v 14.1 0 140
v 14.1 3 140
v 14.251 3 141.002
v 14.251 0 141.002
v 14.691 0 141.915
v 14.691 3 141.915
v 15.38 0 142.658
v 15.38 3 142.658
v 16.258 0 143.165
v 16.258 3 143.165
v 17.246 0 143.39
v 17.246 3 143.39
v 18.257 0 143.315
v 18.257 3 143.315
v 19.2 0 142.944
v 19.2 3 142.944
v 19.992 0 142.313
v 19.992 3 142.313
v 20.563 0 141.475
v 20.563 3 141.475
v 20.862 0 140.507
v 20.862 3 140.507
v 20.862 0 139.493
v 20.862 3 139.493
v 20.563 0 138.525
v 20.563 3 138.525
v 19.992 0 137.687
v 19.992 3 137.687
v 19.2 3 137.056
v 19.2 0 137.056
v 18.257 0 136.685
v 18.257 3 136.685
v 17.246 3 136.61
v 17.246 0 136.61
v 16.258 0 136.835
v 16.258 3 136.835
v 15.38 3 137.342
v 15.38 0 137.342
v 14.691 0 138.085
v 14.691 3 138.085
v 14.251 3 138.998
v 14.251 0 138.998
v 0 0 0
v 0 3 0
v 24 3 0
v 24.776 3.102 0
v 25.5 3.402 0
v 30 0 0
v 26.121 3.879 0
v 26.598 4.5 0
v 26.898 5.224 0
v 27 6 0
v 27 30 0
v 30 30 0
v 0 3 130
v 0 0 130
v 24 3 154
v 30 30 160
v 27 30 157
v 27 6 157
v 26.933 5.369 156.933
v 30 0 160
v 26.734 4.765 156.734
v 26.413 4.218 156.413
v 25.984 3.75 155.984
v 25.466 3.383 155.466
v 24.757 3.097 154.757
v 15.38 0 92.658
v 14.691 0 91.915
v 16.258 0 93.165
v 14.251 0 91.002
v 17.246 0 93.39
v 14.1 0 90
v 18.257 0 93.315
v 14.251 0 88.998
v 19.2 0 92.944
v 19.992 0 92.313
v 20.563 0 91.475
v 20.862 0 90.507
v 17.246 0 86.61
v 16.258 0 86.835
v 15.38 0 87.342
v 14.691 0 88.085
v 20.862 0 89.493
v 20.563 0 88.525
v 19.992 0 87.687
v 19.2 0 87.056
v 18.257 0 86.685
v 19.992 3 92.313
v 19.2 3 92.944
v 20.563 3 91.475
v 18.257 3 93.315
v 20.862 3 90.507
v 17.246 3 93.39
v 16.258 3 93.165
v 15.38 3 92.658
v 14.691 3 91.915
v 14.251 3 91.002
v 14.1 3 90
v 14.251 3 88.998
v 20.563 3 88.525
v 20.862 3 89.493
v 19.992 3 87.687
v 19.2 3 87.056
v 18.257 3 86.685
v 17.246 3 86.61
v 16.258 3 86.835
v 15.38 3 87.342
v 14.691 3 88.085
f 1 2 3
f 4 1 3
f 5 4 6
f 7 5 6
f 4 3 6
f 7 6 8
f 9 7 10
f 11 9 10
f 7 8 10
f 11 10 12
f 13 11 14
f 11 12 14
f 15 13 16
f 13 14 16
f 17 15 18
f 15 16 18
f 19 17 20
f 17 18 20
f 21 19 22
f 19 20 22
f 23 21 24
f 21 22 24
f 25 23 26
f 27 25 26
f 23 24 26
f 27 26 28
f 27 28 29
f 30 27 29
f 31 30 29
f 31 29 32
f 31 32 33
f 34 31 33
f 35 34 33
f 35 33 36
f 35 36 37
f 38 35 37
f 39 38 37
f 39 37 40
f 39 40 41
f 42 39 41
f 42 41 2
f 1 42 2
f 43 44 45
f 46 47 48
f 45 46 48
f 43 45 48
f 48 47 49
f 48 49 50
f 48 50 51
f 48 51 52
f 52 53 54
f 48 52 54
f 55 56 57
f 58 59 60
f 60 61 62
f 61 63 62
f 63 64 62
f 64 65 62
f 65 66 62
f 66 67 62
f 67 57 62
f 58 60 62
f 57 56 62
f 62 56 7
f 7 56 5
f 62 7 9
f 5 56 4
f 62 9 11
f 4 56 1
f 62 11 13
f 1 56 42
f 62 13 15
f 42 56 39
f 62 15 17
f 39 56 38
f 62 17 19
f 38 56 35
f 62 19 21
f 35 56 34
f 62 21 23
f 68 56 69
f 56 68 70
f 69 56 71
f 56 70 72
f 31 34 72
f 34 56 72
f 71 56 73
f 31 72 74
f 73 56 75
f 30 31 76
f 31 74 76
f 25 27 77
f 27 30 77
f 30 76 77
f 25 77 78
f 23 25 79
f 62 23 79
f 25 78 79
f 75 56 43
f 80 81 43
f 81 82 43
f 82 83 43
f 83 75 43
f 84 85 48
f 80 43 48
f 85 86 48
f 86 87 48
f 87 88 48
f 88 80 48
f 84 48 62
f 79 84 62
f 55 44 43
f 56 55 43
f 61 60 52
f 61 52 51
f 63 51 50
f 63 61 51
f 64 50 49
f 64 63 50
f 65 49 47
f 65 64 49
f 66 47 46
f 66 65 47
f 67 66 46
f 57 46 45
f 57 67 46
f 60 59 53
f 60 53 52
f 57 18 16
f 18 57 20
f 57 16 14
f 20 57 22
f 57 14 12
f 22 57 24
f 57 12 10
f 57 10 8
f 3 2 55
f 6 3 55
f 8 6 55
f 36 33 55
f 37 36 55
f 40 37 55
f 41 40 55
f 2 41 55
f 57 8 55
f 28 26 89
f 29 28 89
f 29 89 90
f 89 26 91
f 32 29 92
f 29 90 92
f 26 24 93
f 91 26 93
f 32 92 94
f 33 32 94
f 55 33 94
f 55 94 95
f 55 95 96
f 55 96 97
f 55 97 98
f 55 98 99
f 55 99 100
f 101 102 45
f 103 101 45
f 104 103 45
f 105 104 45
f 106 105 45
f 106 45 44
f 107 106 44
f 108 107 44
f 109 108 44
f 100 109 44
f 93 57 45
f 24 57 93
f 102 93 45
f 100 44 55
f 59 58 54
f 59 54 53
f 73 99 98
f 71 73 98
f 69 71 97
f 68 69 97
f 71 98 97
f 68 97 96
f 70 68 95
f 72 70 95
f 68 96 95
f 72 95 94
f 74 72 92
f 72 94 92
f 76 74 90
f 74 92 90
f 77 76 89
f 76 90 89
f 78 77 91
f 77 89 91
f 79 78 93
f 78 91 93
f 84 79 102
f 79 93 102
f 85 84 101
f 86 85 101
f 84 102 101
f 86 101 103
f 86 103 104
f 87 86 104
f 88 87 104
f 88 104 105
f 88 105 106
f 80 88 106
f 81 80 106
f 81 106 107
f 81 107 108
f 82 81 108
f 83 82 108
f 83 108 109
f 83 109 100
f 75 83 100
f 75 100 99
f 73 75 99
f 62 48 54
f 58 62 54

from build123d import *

# Parameters (mm, degrees)
F1_DEPTH = 160
F2_R     = 3
F4_DEPTH = 30.001
F6_D     = 6.8


with BuildPart() as f1:
    # F0 (on Top) → F1 (new body)
    with BuildSketch(Plane.XY):
        Polygon((0, 3), (0, 0), (30, 0), (30, 30), (27, 30), (27, 3), align=None)
    extrude(amount=F1_DEPTH)

    # F2
    f2_edges = [f1.edges().sort_by_distance(p)[0] for p in [
        (27, 3, 80),
    ]]
    fillet(f2_edges, radius=F2_R)

    # F3 (on face) → F4 (cut, through all)
    with BuildSketch(Plane.XZ):
        Polygon((-10, 120), (40, 170), (-10, 170), align=None)
    extrude(amount=-F4_DEPTH, mode=Mode.SUBTRACT)

    # F6 (through all)
    with Locations(Plane.XZ):
        with Locations((17.5, 140), (17.5, 90)):
            Hole(F6_D / 2)


solid = f1.part
